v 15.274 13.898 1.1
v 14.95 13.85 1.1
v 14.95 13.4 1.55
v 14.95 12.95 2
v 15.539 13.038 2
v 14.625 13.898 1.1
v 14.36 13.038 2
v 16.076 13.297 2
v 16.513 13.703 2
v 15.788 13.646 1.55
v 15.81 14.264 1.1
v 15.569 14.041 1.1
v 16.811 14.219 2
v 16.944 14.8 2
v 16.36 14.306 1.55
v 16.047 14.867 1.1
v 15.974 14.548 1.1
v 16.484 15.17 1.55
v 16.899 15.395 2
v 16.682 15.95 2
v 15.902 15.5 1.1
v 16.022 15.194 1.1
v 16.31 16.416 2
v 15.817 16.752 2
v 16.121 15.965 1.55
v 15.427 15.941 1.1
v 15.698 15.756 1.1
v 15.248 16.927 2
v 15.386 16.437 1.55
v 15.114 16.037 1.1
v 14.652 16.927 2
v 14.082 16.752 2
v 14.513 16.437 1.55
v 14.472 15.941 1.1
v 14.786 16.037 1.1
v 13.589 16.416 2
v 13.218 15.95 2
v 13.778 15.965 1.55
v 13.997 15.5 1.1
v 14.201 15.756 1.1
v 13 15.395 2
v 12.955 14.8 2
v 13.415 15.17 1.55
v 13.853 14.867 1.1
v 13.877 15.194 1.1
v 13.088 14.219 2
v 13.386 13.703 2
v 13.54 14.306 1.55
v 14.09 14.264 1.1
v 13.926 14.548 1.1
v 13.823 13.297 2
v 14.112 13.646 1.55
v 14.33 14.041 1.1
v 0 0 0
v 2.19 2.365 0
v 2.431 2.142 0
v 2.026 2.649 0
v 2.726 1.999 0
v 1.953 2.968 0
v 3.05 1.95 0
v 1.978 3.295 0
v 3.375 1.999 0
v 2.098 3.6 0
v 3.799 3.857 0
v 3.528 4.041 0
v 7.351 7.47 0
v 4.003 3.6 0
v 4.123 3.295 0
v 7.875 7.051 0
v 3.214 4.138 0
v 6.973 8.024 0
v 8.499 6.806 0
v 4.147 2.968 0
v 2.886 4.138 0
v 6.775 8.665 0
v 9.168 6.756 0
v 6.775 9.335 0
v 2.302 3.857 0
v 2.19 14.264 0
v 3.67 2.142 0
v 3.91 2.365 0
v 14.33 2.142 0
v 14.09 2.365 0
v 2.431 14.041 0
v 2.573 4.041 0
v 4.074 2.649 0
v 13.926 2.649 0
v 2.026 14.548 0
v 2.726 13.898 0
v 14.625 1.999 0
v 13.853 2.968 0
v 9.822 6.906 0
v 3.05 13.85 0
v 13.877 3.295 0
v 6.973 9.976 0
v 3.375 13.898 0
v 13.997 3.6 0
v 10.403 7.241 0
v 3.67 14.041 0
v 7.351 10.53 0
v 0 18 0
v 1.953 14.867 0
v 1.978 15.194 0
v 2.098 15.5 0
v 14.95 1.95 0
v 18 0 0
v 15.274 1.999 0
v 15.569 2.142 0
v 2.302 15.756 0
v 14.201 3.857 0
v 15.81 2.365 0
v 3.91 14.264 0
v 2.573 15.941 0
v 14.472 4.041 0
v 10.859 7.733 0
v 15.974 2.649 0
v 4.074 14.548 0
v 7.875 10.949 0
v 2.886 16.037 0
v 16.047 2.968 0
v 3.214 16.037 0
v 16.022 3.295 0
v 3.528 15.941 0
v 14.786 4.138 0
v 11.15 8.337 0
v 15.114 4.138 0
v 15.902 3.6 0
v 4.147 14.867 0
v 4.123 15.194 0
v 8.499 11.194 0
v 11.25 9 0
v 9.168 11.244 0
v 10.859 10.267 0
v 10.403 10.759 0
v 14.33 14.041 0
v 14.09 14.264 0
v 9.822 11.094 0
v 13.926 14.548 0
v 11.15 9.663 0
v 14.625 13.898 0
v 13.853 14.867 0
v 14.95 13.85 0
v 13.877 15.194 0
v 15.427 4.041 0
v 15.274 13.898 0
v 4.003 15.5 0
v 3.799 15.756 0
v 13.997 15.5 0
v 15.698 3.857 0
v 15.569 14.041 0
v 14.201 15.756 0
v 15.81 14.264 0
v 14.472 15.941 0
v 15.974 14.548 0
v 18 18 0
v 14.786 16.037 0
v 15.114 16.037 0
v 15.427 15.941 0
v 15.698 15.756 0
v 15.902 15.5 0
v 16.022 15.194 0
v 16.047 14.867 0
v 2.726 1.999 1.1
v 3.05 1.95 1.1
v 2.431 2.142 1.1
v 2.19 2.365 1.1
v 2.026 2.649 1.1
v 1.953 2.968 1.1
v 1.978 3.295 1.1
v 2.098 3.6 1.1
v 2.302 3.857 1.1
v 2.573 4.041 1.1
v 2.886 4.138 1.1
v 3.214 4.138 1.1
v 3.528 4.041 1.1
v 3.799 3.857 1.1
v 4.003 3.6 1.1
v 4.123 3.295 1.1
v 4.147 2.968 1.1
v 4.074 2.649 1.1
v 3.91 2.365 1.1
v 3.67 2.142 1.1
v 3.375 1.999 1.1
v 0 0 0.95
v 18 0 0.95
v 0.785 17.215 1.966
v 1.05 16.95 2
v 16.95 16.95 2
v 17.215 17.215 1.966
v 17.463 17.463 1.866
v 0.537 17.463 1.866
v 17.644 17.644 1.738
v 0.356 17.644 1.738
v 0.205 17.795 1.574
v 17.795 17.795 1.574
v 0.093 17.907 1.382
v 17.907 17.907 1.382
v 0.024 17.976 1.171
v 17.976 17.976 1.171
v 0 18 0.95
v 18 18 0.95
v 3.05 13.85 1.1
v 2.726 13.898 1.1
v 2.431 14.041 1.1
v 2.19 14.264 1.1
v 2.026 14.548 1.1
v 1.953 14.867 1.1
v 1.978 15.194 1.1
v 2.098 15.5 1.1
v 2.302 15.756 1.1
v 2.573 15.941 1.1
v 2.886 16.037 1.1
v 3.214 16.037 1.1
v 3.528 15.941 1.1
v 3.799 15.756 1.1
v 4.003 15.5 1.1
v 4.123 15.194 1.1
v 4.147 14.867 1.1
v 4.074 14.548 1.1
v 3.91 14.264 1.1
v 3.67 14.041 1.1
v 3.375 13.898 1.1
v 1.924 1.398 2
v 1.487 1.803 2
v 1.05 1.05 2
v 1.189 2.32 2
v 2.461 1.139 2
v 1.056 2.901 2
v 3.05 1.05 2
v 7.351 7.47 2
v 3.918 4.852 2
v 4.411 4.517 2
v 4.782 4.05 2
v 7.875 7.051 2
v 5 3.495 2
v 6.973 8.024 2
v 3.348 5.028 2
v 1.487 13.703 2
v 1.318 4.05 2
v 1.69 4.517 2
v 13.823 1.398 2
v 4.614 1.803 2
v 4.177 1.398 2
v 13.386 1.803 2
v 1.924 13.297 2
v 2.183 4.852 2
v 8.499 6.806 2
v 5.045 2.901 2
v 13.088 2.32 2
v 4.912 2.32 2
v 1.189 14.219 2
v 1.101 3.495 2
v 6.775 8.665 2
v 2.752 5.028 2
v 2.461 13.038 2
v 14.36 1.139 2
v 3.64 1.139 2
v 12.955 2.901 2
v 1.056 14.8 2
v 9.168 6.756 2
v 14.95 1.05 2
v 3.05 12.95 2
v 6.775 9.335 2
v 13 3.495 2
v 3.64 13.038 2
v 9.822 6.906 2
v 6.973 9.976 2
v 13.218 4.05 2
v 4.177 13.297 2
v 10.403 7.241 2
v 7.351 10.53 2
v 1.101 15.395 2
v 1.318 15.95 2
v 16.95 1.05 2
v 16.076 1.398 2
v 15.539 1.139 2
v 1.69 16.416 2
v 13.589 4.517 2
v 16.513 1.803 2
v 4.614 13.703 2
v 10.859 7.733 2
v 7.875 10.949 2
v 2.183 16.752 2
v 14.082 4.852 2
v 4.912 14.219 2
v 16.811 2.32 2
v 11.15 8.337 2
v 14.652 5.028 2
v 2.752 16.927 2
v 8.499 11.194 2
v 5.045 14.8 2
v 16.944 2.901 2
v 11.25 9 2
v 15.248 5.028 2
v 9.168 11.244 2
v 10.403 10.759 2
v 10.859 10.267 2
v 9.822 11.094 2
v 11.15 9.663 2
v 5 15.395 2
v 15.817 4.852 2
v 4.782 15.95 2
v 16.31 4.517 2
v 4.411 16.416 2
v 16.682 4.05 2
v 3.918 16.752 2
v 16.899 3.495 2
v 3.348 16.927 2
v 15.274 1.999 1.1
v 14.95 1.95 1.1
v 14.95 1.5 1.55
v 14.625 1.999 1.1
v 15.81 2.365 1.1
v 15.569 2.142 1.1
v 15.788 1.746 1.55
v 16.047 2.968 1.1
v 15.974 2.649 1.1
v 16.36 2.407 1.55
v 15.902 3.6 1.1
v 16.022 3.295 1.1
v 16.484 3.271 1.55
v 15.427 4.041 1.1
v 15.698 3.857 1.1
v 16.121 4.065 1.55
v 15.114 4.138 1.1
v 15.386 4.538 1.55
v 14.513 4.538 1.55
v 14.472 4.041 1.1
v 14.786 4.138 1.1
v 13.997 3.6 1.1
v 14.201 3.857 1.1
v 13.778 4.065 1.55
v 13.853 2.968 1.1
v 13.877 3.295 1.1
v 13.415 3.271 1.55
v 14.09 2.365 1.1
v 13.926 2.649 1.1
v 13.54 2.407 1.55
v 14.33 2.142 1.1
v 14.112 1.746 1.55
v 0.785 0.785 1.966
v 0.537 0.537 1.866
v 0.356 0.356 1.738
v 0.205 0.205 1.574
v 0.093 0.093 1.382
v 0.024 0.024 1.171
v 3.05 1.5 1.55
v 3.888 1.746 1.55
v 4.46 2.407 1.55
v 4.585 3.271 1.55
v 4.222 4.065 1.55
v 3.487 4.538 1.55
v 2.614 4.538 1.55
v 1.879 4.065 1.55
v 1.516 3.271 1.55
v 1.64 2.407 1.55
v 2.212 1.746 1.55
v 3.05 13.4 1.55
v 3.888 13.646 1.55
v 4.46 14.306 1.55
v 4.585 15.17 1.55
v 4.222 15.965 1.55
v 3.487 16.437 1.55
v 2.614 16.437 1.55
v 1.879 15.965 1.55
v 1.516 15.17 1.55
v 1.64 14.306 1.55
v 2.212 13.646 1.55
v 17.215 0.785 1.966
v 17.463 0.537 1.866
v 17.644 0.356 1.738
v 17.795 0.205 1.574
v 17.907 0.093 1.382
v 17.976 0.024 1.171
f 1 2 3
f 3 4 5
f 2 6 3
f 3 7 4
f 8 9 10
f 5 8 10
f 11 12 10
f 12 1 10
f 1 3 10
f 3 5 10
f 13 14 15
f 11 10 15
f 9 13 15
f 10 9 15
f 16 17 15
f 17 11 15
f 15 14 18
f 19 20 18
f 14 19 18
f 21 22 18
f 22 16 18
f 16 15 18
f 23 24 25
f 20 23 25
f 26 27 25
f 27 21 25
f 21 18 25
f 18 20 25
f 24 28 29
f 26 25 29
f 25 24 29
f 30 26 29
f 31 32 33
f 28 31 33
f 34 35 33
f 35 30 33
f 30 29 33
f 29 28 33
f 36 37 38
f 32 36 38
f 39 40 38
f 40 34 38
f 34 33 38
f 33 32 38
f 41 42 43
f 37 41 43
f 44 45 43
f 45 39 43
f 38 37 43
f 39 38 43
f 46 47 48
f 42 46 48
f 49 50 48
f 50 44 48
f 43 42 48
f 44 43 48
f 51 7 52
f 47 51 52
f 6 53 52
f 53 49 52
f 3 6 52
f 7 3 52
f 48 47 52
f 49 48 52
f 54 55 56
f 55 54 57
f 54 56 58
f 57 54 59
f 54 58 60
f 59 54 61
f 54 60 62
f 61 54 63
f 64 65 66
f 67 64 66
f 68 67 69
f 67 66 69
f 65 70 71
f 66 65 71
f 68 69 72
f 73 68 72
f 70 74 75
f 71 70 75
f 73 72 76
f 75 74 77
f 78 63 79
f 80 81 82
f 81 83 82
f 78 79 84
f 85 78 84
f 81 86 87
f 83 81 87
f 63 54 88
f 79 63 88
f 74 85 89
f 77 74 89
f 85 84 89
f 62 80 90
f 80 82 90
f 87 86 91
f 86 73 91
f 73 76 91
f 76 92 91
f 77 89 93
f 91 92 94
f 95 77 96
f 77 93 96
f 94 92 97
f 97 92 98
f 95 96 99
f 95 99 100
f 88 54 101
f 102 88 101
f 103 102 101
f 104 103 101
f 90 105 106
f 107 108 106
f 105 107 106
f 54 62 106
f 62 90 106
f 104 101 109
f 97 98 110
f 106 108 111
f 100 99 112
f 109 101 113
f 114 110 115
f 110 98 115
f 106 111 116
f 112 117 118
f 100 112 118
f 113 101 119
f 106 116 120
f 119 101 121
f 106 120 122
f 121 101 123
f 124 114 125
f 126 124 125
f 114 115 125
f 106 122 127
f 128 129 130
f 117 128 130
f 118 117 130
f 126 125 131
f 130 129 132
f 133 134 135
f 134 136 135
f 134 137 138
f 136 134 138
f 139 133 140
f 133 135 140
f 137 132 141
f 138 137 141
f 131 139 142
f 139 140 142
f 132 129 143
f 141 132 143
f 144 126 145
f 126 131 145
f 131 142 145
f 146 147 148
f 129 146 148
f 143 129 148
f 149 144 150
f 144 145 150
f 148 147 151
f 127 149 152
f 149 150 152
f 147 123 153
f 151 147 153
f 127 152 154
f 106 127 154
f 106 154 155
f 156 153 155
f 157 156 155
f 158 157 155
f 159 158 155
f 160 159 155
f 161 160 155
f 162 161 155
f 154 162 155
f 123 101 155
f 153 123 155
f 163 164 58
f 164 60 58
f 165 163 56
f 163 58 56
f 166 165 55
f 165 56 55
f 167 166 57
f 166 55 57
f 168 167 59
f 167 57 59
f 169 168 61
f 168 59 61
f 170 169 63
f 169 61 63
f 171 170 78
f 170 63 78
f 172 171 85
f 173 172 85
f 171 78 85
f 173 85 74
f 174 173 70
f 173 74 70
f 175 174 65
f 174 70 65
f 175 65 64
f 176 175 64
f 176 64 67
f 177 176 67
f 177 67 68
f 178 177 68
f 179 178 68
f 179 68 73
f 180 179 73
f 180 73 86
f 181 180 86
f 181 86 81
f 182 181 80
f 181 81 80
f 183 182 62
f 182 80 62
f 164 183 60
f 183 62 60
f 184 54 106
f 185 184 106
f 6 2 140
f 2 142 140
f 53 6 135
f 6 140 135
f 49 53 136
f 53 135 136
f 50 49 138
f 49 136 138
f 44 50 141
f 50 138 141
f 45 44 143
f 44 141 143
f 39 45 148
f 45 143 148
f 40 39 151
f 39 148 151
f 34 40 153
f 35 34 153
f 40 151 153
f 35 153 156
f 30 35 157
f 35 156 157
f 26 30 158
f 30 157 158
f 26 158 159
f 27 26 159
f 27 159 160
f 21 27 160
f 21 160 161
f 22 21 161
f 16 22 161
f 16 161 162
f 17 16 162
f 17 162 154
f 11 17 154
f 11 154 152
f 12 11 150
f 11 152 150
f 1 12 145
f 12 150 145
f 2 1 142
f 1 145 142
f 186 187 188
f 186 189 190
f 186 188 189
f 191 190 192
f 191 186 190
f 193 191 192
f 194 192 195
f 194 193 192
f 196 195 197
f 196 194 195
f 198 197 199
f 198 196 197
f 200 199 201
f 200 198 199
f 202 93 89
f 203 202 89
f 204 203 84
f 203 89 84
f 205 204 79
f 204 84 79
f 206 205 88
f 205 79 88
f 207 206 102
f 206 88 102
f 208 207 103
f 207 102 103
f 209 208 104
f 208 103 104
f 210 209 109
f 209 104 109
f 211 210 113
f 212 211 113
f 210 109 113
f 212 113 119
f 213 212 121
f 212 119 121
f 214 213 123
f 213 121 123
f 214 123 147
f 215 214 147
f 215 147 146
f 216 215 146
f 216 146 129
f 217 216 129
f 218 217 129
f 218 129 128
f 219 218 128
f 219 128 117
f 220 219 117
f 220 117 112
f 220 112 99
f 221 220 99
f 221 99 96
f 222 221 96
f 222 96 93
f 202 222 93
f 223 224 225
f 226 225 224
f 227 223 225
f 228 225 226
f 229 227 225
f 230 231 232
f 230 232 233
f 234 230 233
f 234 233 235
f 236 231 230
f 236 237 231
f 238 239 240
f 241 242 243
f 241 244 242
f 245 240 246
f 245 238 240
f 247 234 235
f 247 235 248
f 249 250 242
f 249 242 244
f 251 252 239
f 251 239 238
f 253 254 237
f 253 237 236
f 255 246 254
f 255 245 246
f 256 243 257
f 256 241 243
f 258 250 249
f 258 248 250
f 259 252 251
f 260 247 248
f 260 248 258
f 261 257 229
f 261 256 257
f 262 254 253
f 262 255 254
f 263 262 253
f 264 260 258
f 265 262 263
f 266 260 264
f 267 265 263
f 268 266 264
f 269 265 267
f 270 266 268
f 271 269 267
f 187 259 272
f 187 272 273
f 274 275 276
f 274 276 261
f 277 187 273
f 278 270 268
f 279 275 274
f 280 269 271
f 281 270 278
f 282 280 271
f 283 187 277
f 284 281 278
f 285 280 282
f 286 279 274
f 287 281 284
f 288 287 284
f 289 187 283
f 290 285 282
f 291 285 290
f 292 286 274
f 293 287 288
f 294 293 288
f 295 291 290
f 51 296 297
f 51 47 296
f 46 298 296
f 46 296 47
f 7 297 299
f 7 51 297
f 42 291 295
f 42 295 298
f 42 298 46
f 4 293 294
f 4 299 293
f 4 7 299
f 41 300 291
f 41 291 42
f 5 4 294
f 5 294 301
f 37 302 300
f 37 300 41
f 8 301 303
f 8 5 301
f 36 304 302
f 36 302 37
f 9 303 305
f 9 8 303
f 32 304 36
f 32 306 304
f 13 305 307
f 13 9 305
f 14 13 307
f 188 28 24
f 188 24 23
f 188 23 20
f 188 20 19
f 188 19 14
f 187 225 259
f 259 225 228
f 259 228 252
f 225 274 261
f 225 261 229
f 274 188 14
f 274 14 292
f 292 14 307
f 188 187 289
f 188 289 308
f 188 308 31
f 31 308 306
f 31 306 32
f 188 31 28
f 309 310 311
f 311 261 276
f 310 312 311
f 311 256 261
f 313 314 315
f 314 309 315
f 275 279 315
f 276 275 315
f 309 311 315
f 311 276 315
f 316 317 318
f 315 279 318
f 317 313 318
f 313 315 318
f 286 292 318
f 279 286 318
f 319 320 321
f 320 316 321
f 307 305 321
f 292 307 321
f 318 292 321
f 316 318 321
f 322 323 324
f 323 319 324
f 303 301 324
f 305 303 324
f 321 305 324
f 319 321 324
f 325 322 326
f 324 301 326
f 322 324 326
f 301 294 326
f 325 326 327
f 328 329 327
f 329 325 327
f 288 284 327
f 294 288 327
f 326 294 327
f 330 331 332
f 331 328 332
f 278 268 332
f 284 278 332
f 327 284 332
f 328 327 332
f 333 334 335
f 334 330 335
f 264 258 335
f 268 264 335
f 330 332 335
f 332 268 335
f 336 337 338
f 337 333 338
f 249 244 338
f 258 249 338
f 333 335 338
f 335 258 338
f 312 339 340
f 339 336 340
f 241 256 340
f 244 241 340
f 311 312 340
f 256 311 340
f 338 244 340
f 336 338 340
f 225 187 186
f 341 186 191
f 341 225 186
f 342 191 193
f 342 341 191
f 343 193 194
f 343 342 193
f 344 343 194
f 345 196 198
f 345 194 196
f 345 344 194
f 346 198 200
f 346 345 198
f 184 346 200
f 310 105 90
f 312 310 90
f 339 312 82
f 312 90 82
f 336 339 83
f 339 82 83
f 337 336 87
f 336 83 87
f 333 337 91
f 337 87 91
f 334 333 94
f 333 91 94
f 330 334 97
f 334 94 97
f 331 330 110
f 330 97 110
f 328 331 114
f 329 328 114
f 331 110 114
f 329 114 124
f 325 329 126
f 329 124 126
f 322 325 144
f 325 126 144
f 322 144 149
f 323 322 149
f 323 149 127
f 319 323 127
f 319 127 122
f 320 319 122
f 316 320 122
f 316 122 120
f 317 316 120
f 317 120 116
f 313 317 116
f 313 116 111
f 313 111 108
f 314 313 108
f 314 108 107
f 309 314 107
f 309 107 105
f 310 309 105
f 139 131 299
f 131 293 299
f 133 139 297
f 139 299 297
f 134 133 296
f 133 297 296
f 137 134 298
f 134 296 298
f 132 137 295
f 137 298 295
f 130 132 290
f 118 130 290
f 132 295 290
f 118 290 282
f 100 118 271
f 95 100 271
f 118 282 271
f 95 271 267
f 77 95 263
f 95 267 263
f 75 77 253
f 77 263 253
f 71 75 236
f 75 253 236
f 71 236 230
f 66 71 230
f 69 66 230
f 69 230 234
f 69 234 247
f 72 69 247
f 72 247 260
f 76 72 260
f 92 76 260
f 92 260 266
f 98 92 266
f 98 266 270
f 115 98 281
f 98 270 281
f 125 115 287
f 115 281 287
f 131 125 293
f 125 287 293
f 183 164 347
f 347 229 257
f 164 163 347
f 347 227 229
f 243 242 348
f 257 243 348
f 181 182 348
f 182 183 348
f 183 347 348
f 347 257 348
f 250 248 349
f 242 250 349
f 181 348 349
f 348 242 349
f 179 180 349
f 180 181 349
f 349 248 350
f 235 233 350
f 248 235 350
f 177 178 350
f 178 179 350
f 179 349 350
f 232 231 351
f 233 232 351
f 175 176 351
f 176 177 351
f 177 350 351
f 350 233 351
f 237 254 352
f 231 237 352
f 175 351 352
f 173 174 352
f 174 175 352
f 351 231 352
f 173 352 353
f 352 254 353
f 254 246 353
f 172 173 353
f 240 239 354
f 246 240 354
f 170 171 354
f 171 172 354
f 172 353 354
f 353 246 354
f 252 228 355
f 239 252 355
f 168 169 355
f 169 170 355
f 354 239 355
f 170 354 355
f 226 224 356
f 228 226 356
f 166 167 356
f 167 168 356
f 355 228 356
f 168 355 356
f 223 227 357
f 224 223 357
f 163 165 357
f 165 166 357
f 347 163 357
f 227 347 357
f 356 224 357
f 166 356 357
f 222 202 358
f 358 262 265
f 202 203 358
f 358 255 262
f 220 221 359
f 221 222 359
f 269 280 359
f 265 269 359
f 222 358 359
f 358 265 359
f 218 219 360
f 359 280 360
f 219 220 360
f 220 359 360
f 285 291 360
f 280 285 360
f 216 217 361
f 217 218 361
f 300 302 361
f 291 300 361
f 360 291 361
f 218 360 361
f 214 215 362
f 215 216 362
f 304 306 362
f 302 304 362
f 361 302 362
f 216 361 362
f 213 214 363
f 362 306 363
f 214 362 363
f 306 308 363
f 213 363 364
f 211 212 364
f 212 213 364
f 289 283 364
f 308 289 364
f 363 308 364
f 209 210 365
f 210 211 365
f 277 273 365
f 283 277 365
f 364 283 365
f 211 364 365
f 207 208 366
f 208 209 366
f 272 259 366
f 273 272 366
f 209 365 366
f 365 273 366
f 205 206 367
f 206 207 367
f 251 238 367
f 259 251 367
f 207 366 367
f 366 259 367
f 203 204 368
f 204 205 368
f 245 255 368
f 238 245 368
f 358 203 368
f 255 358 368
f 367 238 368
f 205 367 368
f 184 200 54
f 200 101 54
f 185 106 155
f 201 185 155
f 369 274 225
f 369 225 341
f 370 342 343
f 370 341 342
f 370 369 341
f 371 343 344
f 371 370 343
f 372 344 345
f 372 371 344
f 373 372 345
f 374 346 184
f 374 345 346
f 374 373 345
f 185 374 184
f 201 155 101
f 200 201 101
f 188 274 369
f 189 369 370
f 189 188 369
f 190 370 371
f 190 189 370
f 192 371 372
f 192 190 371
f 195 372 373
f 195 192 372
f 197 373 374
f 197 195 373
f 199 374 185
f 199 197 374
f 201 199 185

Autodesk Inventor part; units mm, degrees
ref_plane "YZ Plane" through (0, 0, 0) normal (1, 0, 0) x (0, 1, 0)
ref_plane "XZ Plane" through (0, 0, 0) normal (0, 1, 0) x (-1, 0, 0)
ref_plane "XY Plane" through (0, 0, 0) normal (0, 0, 1) x (1, 0, 0)
sketch "Эскиз1" plane through (0, 0, 0) normal (0, 0, 1) x (1, 0, 0)
  line L0 (0, 0) -> (18, 0)
  line L1 (18, 0) -> (18, 18)
  line L2 (18, 18) -> (0, 18)
  line L3 (0, 18) -> (0, 0)
  dimension "d0" = 18
  dimension "d1" = 18
extrude "Выдавливание1" add sketch "Эскиз1" along normal blind 2
sketch "Эскиз8" plane through (0, 0, 2) normal (0, 0, 1) x (1, 0, 0)
  line L0 (18, 18) -> (0, 18) construction
  line L1 (0, 0) -> (18, 18) construction
  line L2 (0, 0) -> (18, 0) construction
  line L3 (0, 18) -> (18, 0) construction
  circle A0 centre (9, 9) radius 2.25
  dimension "d38" = 4.5
extrude "Выдавливание5" cut sketch "Эскиз8" against normal through all
sketch "Эскиз9" plane through (0, 0, 2) normal (0, 0, 1) x (1, 0, 0)
  circle A0 centre (9, 9) radius 2.25 construction
  circle A1 centre (9, 9) radius 4.1 construction
  line L0 (0, 18) -> (0, 0) construction
  line L1 (0, 18) -> (6.1009, 11.8991) construction
  line L2 (18, 0) -> (18, 18) construction
  line L3 (18, 18) -> (11.8991, 11.8991) construction
  line L4 (0, 0) -> (6.1009, 6.1009) construction
  line L5 (0, 0) -> (18, 0) construction
  line L6 (18, 0) -> (11.8991, 6.1009) construction
  point P0 (3.0504, 14.9496)
  point P1 (14.9496, 14.9496)
  point P2 (3.0504, 3.0504)
  point P3 (14.9496, 3.0504)
  dimension "d41" = 8.2
hole "Отверстие4" at (3.0504, 14.9496, 2) at (3.0504, 3.0504, 2) at (14.9496, 3.0504, 2) at (14.9496, 14.9496, 2) direction (0, 0, -1) diameter 2.2 end through all countersink diameter 4 countersink angle 90
fillet "Сопряжение2" radius 1.05 4 edges at (9, 0, 2) (0, 9, 2) (9, 18, 2) (18, 9, 2)
properties part number "Крышка поворотного кулака"
